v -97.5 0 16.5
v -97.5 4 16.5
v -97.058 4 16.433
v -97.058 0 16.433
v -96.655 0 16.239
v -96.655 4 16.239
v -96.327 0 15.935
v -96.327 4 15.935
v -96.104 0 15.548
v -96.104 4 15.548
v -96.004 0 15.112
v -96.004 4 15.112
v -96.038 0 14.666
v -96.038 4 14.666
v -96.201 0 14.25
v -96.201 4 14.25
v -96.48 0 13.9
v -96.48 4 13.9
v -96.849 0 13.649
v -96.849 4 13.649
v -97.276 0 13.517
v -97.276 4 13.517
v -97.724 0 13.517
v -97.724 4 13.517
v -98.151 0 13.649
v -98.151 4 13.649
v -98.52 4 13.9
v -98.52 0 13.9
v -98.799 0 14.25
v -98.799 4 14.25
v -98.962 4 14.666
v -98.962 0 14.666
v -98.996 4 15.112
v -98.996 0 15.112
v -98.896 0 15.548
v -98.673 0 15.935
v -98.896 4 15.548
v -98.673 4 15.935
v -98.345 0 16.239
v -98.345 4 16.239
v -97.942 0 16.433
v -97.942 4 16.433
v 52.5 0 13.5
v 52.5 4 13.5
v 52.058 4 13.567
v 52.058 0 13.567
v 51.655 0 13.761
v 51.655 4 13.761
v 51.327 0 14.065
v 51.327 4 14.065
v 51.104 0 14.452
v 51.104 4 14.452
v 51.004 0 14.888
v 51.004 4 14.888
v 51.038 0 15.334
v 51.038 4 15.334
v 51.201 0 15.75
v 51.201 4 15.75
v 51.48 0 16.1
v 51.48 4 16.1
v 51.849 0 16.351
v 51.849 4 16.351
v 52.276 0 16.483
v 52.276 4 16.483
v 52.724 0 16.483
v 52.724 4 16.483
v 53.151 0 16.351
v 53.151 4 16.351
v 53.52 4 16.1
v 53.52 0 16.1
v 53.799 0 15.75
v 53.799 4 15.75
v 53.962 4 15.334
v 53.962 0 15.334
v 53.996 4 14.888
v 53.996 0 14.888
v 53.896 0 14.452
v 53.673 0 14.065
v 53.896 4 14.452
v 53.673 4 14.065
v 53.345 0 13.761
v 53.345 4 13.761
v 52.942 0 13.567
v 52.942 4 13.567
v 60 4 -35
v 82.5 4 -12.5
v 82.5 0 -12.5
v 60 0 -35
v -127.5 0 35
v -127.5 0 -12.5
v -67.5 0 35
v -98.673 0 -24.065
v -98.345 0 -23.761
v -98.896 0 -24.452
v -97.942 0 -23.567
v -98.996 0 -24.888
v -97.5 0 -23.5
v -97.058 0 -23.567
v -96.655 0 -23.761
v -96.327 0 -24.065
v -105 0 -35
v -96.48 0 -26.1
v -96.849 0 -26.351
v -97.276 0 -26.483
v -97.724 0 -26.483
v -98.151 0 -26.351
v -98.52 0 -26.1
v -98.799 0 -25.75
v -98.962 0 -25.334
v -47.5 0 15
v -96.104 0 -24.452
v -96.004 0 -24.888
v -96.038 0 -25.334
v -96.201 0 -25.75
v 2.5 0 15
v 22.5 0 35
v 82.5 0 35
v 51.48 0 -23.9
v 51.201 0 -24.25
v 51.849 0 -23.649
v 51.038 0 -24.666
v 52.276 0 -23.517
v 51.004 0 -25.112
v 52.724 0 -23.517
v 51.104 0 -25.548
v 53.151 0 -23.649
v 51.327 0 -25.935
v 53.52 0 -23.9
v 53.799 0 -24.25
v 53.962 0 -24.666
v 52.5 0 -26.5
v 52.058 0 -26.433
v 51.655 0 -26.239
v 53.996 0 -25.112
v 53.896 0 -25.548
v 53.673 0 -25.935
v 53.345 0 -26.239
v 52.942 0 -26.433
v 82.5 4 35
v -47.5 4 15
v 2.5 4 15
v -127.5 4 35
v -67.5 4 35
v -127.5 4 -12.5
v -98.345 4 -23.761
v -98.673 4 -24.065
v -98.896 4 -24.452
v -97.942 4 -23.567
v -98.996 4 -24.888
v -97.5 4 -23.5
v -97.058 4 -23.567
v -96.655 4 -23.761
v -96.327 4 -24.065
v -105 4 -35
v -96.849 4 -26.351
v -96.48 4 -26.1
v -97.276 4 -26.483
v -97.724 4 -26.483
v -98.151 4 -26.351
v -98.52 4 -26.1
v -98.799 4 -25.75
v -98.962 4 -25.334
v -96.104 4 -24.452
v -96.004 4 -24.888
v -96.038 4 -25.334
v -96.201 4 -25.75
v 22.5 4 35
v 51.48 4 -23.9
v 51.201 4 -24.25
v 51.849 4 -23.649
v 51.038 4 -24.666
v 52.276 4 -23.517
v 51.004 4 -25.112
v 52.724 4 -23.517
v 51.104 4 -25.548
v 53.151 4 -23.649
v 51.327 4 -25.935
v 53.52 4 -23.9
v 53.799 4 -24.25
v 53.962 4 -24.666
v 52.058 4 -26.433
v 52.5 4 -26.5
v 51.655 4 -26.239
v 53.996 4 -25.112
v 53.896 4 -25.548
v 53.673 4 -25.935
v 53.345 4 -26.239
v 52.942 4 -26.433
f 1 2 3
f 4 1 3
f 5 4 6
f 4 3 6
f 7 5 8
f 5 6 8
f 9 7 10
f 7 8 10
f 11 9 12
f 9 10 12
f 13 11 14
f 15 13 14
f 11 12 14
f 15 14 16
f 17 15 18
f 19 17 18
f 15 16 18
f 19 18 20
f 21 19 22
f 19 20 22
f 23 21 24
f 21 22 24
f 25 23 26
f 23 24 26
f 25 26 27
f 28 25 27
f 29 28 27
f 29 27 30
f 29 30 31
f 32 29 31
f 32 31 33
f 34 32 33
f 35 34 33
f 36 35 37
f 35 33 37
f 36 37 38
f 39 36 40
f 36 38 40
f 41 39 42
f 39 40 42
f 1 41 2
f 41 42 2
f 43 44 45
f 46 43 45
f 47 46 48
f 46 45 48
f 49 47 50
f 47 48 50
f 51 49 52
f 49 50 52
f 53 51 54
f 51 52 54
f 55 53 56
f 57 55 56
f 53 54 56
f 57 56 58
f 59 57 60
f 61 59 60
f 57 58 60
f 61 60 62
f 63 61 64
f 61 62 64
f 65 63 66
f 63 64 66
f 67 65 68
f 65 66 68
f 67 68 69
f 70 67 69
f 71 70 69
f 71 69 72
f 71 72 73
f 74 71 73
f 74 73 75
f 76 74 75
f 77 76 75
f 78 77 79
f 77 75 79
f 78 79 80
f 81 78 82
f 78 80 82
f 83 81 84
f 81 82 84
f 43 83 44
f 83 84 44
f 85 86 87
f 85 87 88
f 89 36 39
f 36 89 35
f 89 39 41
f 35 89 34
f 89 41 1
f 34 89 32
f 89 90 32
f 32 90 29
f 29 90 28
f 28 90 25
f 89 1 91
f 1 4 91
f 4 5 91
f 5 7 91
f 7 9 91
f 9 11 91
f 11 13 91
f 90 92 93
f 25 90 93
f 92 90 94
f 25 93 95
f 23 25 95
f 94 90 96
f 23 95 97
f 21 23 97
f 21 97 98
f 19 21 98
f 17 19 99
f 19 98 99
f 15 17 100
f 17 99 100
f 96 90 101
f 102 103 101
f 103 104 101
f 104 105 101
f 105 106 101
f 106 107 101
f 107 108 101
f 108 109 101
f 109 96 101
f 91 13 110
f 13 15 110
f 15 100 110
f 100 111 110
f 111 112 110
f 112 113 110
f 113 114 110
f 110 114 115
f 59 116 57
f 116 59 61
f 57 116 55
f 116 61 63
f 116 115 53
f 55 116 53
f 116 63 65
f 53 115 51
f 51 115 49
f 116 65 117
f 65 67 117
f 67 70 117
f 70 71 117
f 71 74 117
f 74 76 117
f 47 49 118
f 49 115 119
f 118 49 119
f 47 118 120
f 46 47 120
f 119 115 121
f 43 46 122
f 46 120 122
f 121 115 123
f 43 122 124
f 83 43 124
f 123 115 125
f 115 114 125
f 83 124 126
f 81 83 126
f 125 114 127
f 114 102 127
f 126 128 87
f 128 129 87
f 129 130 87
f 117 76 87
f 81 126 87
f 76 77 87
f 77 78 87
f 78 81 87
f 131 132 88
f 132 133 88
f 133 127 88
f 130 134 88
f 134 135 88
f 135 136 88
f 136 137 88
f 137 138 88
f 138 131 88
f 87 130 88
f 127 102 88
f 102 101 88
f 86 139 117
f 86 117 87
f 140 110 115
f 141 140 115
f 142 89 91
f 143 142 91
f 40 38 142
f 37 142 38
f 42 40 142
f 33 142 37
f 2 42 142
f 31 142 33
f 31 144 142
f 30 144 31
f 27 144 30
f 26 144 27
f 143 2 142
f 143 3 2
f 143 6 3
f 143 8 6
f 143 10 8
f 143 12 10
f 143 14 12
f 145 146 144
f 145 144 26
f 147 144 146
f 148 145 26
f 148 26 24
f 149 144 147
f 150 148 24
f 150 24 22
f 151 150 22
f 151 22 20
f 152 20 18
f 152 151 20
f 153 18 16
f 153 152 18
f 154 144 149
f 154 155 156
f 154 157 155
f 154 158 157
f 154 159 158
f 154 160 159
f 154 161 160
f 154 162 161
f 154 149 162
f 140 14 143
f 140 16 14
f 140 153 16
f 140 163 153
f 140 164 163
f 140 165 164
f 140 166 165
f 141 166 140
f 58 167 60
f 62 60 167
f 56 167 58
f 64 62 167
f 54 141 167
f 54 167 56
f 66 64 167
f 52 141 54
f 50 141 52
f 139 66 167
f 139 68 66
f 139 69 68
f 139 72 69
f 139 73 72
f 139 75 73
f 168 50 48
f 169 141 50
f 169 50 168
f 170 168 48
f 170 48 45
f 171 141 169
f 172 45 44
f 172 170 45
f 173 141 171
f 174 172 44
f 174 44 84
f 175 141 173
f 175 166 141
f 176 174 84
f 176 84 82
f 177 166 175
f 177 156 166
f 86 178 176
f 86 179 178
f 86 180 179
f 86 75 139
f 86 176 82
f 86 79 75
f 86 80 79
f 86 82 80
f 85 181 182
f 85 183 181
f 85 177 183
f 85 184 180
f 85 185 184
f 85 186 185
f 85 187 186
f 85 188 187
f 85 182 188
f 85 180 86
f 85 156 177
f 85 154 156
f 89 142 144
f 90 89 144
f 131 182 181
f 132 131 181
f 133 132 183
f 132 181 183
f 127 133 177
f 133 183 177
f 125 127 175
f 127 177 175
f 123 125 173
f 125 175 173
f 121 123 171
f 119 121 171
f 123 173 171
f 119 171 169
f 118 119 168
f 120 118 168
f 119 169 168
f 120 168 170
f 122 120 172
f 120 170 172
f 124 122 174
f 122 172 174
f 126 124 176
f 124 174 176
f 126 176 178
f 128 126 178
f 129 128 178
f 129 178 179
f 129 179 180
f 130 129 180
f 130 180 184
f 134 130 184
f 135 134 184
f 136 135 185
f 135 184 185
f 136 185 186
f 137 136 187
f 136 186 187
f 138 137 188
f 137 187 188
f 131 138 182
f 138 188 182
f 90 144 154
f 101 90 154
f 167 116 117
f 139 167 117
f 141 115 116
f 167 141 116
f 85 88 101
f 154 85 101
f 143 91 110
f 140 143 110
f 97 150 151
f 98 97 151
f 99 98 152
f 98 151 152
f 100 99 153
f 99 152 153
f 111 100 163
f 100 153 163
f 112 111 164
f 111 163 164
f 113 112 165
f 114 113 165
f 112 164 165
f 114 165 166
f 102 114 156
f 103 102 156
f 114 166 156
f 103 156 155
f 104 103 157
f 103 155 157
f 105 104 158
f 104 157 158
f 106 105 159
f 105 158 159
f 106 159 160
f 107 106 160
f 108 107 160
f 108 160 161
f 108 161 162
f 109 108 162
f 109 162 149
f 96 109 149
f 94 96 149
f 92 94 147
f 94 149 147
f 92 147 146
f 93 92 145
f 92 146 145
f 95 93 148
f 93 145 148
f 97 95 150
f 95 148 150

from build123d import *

# Parameters (mm, degrees)
EXTRUDE_1_DEPTH     = 4
SKETCH_2_R          = 1.5
CUT_EXTRUDE_1_DEPTH = 4
SKETCH_3_W          = 10
SKETCH_3_H          = 69.678883607
SKETCH_3_H_2        = 93.047687854
CUT_EXTRUDE_2_DEPTH = 4
CUT_EXTRUDE_3_DEPTH = 4


with BuildPart() as part:
    # 草图1 → 凸台-拉伸1 (new body)
    with BuildSketch(Plane(origin=(0, 0, 0), x_dir=(1, 0, 0), z_dir=(0, 1, 0))):
        Polygon((-67.5, -35), (-47.5, -15), (2.5, -15), (22.5, -35), (92.5, -35), (92.5, 15), (72.5, 35), (-117.5, 35), (-137.5, 15), (-137.5, -35), align=None)
    extrude(amount=EXTRUDE_1_DEPTH)

    # 草图2 → 切除-拉伸1 (cut)
    with BuildSketch(Plane(origin=(0, 4, 0), x_dir=(1, 0, 0), z_dir=(0, 1, 0))):
        with Locations(Location((-97.5, -15, 0), (0, 0, 270))):
            Circle(SKETCH_2_R)
        with Locations(Location((-97.5, 25, 0), (0, 0, 270))):
            Circle(SKETCH_2_R)
        with Locations(Location((52.5, 25, 0), (0, 0, 90))):
            Circle(SKETCH_2_R)
        with Locations(Location((52.5, -15, 0), (0, 0, 90))):
            Circle(SKETCH_2_R)
    extrude(amount=-CUT_EXTRUDE_1_DEPTH, mode=Mode.SUBTRACT)

    # 草图3 → 切除-拉伸2 (cut)
    with BuildSketch(Plane(origin=(0, 4, 0), x_dir=(1, 0, 0), z_dir=(0, 1, 0))):
        with Locations((-132.5, -0.160558196)):
            Rectangle(SKETCH_3_W, SKETCH_3_H)
        with Locations((87.5, 11.523843927)):
            Rectangle(SKETCH_3_W, SKETCH_3_H_2)
    extrude(amount=-CUT_EXTRUDE_2_DEPTH, mode=Mode.SUBTRACT)

    # 草图4 → 切除-拉伸3 (cut)
    with BuildSketch(Plane(origin=(0, 4, 0), x_dir=(1, 0, 0), z_dir=(0, 1, 0))):
        Polygon((-127.5, 12.5), (-92.197077218, 47.802922782), (-150.178982695, 47.802922782), align=None)
        Polygon((82.5, 12.5), (37.005283765, 57.994716235), (96.544114713, 56.205234398), align=None)
    extrude(amount=-CUT_EXTRUDE_3_DEPTH, mode=Mode.SUBTRACT)


solid = part.part
